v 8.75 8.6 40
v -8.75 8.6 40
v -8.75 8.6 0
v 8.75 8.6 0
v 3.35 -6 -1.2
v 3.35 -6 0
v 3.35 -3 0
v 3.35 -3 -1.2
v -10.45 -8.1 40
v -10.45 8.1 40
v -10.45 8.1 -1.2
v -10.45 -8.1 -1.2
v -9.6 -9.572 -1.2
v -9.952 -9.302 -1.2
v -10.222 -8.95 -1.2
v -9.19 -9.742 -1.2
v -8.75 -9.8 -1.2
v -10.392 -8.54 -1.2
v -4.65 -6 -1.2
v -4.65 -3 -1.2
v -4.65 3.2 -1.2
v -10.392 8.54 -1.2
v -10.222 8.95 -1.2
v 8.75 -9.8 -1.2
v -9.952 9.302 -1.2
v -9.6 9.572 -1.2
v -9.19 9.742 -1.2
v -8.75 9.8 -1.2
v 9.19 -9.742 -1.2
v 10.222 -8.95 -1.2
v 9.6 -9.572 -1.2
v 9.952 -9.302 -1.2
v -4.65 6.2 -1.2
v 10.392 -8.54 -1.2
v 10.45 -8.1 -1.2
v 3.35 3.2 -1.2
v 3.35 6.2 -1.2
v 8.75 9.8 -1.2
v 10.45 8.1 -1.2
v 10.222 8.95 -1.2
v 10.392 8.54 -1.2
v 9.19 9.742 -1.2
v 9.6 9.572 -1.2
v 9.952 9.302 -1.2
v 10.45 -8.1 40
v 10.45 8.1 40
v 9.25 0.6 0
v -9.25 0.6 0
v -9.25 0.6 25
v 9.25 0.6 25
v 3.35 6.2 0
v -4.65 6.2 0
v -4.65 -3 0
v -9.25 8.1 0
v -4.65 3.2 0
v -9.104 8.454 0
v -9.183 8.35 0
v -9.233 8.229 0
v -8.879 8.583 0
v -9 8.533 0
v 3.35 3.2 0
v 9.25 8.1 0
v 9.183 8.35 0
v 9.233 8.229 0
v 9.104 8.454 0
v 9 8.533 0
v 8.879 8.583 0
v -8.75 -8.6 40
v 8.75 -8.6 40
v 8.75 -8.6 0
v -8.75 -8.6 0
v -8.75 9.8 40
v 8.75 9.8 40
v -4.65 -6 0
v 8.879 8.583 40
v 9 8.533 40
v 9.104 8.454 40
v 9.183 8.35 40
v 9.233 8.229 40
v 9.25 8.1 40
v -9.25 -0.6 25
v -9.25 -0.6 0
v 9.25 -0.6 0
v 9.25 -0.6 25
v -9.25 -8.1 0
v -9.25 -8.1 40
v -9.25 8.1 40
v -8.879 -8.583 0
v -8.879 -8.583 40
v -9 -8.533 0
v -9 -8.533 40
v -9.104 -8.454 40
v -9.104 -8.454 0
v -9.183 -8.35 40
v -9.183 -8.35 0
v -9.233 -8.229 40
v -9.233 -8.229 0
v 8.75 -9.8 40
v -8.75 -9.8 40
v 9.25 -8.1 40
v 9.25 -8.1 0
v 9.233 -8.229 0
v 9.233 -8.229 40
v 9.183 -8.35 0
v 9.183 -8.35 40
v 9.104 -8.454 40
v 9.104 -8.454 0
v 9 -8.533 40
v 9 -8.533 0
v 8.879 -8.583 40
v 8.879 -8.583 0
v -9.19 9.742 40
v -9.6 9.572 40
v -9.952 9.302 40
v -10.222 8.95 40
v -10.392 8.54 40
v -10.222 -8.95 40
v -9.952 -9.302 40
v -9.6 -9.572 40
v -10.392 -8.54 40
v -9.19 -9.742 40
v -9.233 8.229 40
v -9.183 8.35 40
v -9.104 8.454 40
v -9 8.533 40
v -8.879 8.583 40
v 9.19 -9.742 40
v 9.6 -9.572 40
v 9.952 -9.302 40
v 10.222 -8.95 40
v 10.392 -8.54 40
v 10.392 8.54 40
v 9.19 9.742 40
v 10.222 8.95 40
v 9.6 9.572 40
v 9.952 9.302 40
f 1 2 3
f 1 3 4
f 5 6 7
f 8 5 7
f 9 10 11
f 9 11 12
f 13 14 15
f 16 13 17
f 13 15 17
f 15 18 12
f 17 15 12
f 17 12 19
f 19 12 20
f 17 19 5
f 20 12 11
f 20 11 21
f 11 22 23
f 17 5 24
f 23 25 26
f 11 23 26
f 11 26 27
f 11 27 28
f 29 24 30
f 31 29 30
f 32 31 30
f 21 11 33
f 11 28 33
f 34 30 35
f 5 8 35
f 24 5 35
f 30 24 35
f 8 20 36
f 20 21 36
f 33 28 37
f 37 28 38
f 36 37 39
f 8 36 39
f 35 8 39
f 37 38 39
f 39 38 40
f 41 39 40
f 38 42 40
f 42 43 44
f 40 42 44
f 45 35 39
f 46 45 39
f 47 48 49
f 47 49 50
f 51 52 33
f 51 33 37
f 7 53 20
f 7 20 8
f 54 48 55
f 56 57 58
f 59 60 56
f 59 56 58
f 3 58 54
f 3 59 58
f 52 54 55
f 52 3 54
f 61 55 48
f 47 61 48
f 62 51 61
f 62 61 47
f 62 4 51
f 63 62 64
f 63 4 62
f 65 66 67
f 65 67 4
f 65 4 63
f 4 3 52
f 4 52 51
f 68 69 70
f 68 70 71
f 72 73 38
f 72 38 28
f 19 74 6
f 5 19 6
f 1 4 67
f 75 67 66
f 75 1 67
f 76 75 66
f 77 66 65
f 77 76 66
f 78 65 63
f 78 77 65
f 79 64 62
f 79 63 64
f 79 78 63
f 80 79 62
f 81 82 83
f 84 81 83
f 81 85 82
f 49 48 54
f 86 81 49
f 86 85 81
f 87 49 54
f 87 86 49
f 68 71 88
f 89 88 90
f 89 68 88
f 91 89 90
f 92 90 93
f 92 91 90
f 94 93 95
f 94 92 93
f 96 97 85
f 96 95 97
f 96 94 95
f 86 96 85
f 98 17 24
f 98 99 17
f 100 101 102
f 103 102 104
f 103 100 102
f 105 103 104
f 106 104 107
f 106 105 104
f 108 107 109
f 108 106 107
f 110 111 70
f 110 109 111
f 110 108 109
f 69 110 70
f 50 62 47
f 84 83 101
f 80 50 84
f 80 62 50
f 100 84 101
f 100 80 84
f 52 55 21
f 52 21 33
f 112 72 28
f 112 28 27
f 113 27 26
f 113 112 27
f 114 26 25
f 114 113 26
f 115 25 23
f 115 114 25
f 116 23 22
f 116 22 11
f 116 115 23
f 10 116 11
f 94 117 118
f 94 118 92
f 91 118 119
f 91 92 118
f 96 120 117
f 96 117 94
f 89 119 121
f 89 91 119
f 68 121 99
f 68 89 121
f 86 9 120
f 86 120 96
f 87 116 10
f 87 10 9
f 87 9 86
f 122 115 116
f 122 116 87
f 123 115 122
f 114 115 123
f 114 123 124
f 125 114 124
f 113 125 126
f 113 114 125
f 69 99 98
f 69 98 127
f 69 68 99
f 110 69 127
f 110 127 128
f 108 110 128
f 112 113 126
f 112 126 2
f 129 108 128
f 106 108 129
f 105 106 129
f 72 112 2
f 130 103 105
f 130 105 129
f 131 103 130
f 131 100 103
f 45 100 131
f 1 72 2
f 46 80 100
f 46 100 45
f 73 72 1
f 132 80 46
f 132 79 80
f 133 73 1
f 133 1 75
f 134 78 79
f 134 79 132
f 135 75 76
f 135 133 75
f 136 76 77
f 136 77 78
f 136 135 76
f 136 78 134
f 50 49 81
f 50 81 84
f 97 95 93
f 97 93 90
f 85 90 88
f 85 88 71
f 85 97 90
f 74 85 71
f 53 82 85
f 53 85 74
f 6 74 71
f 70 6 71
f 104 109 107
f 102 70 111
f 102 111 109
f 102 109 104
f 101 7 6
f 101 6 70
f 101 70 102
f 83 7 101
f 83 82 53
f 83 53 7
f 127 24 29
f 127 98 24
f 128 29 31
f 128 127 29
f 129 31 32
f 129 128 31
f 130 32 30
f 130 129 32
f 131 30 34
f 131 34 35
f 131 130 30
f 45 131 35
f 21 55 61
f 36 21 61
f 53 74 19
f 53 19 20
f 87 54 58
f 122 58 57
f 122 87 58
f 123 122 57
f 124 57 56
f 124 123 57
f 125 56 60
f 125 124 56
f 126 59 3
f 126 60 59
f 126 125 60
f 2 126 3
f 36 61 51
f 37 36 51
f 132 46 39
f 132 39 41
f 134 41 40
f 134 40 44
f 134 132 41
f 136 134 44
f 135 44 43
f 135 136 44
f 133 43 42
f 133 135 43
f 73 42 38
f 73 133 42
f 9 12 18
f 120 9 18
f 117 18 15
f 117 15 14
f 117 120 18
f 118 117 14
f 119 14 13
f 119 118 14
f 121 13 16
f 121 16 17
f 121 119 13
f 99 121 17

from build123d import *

# Parameters (mm, degrees)
F1_DEPTH      = 40
F1_DEPTH_BACK = 1.2
F0_W          = 8
F0_H          = 3
F0_W_2        = 18.5
F0_H_2        = 1.2
F2_DEPTH      = 1.2
F3_DEPTH      = 25


with BuildPart() as f1:
    # F0 (on Top) → F1 (new body, two sides)
    with BuildSketch(Plane.XY) as f1_sk:
        with BuildLine():
            Line((10.45, -8.1), (10.45, 8.1))
            ThreePointArc((10.45, 8.1), (9.952082, 9.302082), (8.75, 9.8))
            Line((8.75, 9.8), (-8.75, 9.8))
            ThreePointArc((-8.75, 9.8), (-9.952082, 9.302082), (-10.45, 8.1))
            Line((-10.45, 8.1), (-10.45, -8.1))
            ThreePointArc((-10.45, -8.1), (-9.952082, -9.302082), (-8.75, -9.8))
            Line((-8.75, -9.8), (8.75, -9.8))
            ThreePointArc((8.75, -9.8), (9.952082, -9.302082), (10.45, -8.1))
        make_face()
        with BuildLine():
            ThreePointArc((9.25, -8.1), (9.103553, -8.453553), (8.75, -8.6))
            Line((8.75, -8.6), (-8.75, -8.6))
            ThreePointArc((-8.75, -8.6), (-9.103553, -8.453553), (-9.25, -8.1))
            Line((-9.25, -8.1), (-9.25, -0.6))
            Line((-9.25, -0.6), (-9.25, 0.6))
            Line((-9.25, 0.6), (-9.25, 8.1))
            ThreePointArc((-9.25, 8.1), (-9.103553, 8.453553), (-8.75, 8.6))
            Line((-8.75, 8.6), (8.75, 8.6))
            ThreePointArc((8.75, 8.6), (9.103553, 8.453553), (9.25, 8.1))
            Line((9.25, 8.1), (9.25, 0.6))
            Line((9.25, 0.6), (9.25, -0.6))
            Line((9.25, -0.6), (9.25, -8.1))
        make_face(mode=Mode.SUBTRACT)
    extrude(amount=F1_DEPTH)
    extrude(f1_sk.sketch, amount=-F1_DEPTH_BACK)

    # F0 (on Top) → F2 (join)
    with BuildSketch(Plane.XY):
        with BuildLine():
            Line((-9.25, 0.6), (9.25, 0.6))
            Line((9.25, 0.6), (9.25, 8.1))
            ThreePointArc((9.25, 8.1), (9.103553, 8.453553), (8.75, 8.6))
            Line((8.75, 8.6), (-8.75, 8.6))
            ThreePointArc((-8.75, 8.6), (-9.103553, 8.453553), (-9.25, 8.1))
            Line((-9.25, 8.1), (-9.25, 0.6))
        make_face()
        with Locations((-0.65, 4.7)):
            Rectangle(F0_W, F0_H, mode=Mode.SUBTRACT)
        Rectangle(F0_W_2, F0_H_2)
        with BuildLine():
            Line((-8.75, -8.6), (8.75, -8.6))
            ThreePointArc((8.75, -8.6), (9.103553, -8.453553), (9.25, -8.1))
            Line((9.25, -8.1), (9.25, -0.6))
            Line((9.25, -0.6), (-9.25, -0.6))
            Line((-9.25, -0.6), (-9.25, -8.1))
            ThreePointArc((-9.25, -8.1), (-9.103553, -8.453553), (-8.75, -8.6))
        make_face()
        with Locations((-0.65, -4.5)):
            Rectangle(F0_W, F0_H, mode=Mode.SUBTRACT)
    extrude(amount=-F2_DEPTH)

    # F0 (on Top) → F3 (join)
    with BuildSketch(Plane.XY):
        Rectangle(F0_W_2, F0_H_2)
    extrude(amount=F3_DEPTH)


solid = f1.part
